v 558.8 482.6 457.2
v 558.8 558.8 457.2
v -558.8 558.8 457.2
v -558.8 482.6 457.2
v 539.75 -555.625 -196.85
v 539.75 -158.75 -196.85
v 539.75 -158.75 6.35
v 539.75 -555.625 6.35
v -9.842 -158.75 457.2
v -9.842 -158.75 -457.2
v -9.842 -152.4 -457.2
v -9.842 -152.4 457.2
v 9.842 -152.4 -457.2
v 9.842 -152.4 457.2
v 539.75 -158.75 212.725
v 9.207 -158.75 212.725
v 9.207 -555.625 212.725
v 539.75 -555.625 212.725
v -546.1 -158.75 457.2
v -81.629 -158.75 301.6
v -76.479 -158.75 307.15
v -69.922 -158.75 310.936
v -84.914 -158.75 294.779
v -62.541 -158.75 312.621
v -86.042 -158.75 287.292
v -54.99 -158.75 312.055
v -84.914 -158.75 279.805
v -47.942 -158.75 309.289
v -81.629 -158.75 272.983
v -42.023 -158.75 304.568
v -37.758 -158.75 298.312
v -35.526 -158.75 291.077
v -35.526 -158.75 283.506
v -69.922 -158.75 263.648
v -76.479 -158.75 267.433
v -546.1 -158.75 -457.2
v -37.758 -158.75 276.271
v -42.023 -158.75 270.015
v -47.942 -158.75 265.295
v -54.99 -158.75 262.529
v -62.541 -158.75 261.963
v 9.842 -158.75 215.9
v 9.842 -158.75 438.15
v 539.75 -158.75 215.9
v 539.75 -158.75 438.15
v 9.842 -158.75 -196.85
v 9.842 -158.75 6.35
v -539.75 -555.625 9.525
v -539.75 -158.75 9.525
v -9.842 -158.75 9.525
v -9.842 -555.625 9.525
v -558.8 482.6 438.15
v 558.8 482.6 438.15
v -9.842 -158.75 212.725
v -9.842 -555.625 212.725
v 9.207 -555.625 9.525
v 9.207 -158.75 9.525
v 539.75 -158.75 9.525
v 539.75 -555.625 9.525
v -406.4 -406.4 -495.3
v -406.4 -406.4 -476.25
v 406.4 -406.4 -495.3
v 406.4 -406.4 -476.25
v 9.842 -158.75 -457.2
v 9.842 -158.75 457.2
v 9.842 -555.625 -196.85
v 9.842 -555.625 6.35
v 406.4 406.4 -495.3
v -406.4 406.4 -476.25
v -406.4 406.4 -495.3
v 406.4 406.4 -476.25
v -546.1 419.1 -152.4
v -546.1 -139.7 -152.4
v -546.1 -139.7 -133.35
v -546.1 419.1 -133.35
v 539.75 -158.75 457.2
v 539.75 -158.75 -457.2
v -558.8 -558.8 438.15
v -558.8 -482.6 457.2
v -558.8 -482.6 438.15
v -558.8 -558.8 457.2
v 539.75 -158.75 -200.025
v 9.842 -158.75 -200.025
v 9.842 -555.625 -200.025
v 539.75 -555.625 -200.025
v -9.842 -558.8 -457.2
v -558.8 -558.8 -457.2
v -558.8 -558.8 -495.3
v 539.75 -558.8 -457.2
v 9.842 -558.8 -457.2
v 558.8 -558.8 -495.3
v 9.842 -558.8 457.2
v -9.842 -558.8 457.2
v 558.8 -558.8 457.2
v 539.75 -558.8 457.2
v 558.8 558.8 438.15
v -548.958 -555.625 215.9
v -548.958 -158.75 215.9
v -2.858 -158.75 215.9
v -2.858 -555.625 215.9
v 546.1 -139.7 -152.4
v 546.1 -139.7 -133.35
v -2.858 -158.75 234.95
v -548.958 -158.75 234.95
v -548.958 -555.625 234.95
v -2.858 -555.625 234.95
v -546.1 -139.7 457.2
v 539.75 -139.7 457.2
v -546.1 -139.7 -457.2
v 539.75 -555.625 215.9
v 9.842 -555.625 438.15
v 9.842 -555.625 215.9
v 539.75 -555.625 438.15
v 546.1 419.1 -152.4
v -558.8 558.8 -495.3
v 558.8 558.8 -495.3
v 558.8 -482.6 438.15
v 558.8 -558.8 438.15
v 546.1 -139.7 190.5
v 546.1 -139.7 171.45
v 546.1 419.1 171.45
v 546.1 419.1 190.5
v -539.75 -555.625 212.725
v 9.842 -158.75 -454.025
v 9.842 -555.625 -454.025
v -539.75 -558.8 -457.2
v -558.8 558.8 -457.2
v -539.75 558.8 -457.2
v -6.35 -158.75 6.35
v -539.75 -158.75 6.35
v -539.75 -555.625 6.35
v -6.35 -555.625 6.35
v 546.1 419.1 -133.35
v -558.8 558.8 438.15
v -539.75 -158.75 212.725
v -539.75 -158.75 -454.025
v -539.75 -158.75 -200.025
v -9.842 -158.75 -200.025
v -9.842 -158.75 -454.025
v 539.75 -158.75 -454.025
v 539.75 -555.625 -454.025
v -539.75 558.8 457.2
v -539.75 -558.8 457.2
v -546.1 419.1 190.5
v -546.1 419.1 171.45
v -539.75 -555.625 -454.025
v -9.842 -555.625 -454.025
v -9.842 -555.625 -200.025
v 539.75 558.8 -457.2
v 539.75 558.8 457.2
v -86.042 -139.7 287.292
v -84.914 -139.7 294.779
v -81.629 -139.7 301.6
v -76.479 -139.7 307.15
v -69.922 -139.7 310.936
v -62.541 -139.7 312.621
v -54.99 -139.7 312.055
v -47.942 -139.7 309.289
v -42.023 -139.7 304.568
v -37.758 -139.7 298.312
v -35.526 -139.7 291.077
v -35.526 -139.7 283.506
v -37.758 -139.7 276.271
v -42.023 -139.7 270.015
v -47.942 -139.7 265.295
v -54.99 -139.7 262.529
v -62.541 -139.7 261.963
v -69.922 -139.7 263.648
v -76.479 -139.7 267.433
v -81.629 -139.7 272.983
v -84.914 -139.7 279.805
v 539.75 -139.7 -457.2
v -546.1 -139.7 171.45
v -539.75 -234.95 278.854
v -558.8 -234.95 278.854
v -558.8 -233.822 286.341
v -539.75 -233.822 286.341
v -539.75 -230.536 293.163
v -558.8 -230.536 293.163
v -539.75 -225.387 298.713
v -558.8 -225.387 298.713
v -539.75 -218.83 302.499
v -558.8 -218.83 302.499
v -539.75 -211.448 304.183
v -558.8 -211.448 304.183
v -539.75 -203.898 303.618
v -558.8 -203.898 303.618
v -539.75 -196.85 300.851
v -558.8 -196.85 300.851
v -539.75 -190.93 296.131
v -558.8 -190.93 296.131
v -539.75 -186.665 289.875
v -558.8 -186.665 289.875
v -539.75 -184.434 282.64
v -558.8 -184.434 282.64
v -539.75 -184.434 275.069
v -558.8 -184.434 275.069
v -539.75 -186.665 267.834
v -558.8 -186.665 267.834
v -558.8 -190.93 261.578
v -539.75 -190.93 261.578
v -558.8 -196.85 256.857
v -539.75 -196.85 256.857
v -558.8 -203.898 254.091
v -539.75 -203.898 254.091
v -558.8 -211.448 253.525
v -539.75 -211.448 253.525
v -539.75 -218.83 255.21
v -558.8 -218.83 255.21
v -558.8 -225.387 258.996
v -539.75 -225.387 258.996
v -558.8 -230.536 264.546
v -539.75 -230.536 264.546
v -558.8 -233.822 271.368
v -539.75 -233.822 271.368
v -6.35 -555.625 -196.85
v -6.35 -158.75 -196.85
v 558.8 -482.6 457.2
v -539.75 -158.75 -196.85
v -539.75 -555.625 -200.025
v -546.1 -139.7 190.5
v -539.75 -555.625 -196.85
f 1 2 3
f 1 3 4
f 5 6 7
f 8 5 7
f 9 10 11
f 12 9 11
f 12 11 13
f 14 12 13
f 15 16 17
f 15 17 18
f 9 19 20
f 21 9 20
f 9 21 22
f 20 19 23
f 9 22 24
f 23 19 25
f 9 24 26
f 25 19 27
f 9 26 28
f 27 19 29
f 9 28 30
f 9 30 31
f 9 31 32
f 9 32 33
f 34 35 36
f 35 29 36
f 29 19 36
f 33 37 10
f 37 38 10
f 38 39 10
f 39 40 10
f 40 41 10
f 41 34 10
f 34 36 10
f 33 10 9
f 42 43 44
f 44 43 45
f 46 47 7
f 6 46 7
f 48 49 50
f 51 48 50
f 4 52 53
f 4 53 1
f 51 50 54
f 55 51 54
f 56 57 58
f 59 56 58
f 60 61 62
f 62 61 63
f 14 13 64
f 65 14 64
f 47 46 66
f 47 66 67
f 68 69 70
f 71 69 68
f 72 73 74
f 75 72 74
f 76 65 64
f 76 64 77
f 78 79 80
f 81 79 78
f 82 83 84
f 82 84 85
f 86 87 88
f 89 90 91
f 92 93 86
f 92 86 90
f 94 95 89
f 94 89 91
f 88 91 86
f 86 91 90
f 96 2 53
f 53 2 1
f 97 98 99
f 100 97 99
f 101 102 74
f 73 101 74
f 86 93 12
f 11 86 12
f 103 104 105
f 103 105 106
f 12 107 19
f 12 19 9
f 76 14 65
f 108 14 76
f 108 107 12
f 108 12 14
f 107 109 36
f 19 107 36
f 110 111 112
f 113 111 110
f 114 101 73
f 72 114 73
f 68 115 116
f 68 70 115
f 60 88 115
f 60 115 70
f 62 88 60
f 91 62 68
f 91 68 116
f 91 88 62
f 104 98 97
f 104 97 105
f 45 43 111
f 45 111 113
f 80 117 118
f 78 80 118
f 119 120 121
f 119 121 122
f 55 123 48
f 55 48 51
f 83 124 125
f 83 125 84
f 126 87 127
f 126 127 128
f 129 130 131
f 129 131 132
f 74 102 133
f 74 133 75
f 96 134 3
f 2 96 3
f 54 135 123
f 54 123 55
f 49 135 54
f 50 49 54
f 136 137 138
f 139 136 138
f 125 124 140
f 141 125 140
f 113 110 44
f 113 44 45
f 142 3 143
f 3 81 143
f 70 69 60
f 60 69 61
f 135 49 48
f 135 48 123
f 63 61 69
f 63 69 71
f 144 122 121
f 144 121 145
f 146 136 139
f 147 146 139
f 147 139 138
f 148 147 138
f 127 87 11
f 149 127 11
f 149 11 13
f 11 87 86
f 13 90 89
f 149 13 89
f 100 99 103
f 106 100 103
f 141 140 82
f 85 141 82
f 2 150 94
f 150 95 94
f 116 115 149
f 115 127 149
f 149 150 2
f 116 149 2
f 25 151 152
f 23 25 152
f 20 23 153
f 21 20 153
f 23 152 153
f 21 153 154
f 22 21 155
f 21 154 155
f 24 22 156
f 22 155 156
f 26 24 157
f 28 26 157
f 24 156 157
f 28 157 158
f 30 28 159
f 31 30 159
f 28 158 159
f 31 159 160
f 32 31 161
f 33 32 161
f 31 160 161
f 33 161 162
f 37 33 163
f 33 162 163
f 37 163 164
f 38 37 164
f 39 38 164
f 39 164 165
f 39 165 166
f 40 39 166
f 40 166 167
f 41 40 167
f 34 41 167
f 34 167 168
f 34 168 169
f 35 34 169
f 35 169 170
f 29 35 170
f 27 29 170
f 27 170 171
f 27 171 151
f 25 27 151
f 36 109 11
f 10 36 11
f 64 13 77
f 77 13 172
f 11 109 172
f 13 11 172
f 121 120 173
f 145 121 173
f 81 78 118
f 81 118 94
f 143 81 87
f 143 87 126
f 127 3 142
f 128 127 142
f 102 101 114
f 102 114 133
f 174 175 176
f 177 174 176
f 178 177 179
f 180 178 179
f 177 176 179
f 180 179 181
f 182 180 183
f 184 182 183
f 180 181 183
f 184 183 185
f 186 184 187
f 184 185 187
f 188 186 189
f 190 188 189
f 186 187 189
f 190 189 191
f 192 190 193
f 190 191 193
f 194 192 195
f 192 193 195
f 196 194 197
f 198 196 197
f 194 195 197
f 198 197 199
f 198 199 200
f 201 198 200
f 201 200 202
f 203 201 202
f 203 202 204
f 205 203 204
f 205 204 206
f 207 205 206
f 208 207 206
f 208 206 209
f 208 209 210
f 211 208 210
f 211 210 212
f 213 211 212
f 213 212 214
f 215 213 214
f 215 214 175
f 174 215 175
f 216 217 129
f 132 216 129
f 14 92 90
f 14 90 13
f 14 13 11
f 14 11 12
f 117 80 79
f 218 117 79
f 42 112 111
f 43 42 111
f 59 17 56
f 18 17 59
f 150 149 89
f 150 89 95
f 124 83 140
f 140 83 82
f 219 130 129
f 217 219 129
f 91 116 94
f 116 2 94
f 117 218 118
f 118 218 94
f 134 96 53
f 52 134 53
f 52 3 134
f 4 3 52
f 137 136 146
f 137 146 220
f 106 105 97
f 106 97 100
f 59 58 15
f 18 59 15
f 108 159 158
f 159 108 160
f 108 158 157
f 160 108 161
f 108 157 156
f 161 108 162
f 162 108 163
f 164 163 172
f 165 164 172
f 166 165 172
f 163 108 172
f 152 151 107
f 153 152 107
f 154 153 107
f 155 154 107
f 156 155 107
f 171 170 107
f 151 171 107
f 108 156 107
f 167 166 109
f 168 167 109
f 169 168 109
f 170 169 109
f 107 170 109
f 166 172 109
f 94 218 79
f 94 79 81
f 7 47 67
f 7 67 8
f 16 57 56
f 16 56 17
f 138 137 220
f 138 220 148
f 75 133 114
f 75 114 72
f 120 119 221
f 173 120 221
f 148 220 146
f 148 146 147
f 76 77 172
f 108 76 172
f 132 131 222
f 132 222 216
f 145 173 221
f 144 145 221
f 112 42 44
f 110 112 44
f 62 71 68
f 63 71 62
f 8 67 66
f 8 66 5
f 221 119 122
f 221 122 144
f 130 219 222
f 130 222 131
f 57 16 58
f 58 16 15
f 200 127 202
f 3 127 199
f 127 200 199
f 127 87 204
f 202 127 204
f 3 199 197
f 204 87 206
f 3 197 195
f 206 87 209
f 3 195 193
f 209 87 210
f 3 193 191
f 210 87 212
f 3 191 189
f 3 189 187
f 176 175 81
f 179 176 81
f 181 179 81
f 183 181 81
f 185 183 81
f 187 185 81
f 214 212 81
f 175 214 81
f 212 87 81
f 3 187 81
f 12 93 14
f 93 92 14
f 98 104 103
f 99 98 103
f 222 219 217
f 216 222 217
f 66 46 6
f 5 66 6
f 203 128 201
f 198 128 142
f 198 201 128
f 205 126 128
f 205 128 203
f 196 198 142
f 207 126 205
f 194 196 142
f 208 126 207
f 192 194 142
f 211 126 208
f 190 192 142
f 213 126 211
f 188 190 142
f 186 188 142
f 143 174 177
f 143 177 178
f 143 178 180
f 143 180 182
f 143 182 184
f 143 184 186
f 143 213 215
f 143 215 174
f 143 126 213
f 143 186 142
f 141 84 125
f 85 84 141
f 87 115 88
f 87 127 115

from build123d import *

# Parameters (mm, degrees)
F1_W          = 19.05
F1_H          = 914.4
F3_DEPTH      = 558.8
F3_DEPTH_BACK = 558.8
F2_W          = 19.05
F2_H          = 914.4
F4_DEPTH      = 558.8
F4_DEPTH_BACK = 558.8
F0_W          = 1117.6
F0_H          = 19.05
F5_DEPTH      = 558.8
F5_DEPTH_BACK = 558.8
F6_W          = 406.4
F6_H          = 914.4
F7_DEPTH      = 9.8425
F7_DEPTH_BACK = 9.8425
F8_W          = 76.2
F8_H          = 19.05
F9_DEPTH      = 1117.6
F11_DEPTH     = 914.4
F12_W         = 1117.6
F12_H         = 1117.6
F12_W_2       = 812.8
F12_H_2       = 812.8
F13_DEPTH     = 19.05
F14_W         = 546.1
F14_H         = 19.05
F15_DEPTH     = 396.875
F17_D         = 50.8
F17_DEPTH     = 25.4
F17_TIP       = 15.2618597233
F18_W         = 529.9075
F18_H         = 203.2
F19_DEPTH     = 396.875
F21_D         = 50.8
F21_DEPTH     = 25.4
F21_TIP       = 15.2618597233
F22_W         = 533.4
F22_H         = 203.2
F23_DEPTH     = 396.875
F24_W         = 529.9075
F24_H         = 254
F25_DEPTH     = 396.875
F24_H_2       = 203.2
F24_W_2       = 530.5425
F24_H_3       = 222.25
F26_W         = 1092.2
F26_H         = 19.05
F27_DEPTH     = 558.8


with BuildPart() as f3:
    # F1 (on Front) → F3 (new body, two sides)
    with BuildSketch(Plane.XZ) as f3_sk:
        with Locations((-549.275, 0)):
            Rectangle(F1_W, F1_H)
    extrude(amount=F3_DEPTH)
    extrude(f3_sk.sketch, amount=-F3_DEPTH_BACK)

    # F17
    with Locations(Plane.YZ.offset(-539.75)):
        with Locations((-209.55, 278.8544340611)):
            Hole(F17_D / 2, depth=F17_DEPTH)
            with Locations((0, 0, -(F17_DEPTH + F17_TIP / 2))):  # 118° drill point
                Cone(0, F17_D / 2, F17_TIP, mode=Mode.SUBTRACT)


with BuildPart() as f4:
    # F2 (on Front) → F4 (new body, two sides)
    with BuildSketch(Plane.XZ) as f4_sk:
        with Locations((549.275, 0)):
            Rectangle(F2_W, F2_H)
    extrude(amount=F4_DEPTH)
    extrude(f4_sk.sketch, amount=-F4_DEPTH_BACK)

    # F0 (on Front) → F5 (join, two sides)
    with BuildSketch(Plane.XZ) as f5_sk:
        with Locations((0, -466.725)):
            Rectangle(F0_W, F0_H)
    extrude(amount=F5_DEPTH)
    extrude(f5_sk.sketch, amount=-F5_DEPTH_BACK)

    # F6 (on Right) → F7 (join, two sides)
    with BuildSketch(Plane.YZ) as f7_sk:
        with Locations((-355.6, 0)):
            Rectangle(F6_W, F6_H)
    extrude(amount=F7_DEPTH)
    extrude(f7_sk.sketch, amount=-F7_DEPTH_BACK)

    # F12 (on face) → F13 (join)
    with BuildSketch(Plane(origin=(0, 0, -476.25), x_dir=(1, 0, 0), z_dir=(0, 0, -1))):
        Rectangle(F12_W, F12_H)
        Rectangle(F12_W_2, F12_H_2, mode=Mode.SUBTRACT)
    extrude(amount=F13_DEPTH)


with BuildPart() as f9:
    # F8 (on face) → F9 (new body)
    with BuildSketch(Plane(origin=(-558.8, 0, 0), x_dir=(0, -1, 0), z_dir=(-1, 0, 0))):
        with Locations((-520.7, 447.675)):
            Rectangle(F8_W, F8_H)
    extrude(amount=-F9_DEPTH)


with BuildPart() as f9b:
    # F8 (on face) → F9, piece 2 (new body)
    with BuildSketch(Plane(origin=(-558.8, 0, 0), x_dir=(0, -1, 0), z_dir=(-1, 0, 0))):
        with Locations((520.7, 447.675)):
            Rectangle(F8_W, F8_H)
    extrude(amount=-F9_DEPTH)


with BuildPart() as f11:
    # F10 (on face) → F11 (new body)
    with BuildSketch(Plane.XY.offset(-457.2)):
        Polygon((539.75, -139.7), (-546.1, -139.7), (-546.1, -158.75), (-9.8425, -158.75), (-9.8425, -152.4), (9.8425, -152.4), (9.8425, -158.75), (539.75, -158.75), align=None)
    extrude(amount=F11_DEPTH)

    # F21
    with Locations(Plane.XZ.offset(158.75)):
        with Locations((-60.6425, 287.2917993546)):
            Hole(F21_D / 2, depth=F21_DEPTH)
            with Locations((0, 0, -(F21_DEPTH + F21_TIP / 2))):  # 118° drill point
                Cone(0, F21_D / 2, F21_TIP, mode=Mode.SUBTRACT)


with BuildPart() as f15:
    # F14 (on face) → F15 (new body)
    with BuildSketch(Plane.XZ.offset(158.75)):
        with Locations((-275.9075, 225.425)):
            Rectangle(F14_W, F14_H)
    extrude(amount=F15_DEPTH)


with BuildPart() as f19:
    # F18 (on face) → F19 (new body)
    with BuildSketch(Plane.XZ.offset(158.75)):
        with Locations((-274.79625, 111.125)):
            Rectangle(F18_W, F18_H)
    extrude(amount=F19_DEPTH)


with BuildPart() as f23:
    # F22 (on face) → F23 (new body)
    with BuildSketch(Plane.XZ.offset(158.75)):
        with Locations((-273.05, -95.25)):
            Rectangle(F22_W, F22_H)
    extrude(amount=F23_DEPTH)


with BuildPart() as f25:
    # F24 (on face) → F25 (new body)
    with BuildSketch(Plane.XZ.offset(158.75)):
        with Locations((-274.79625, -327.025)):
            Rectangle(F24_W, F24_H)
    extrude(amount=F25_DEPTH)


with BuildPart() as f25b:
    # F24 (on face) → F25, piece 2 (new body)
    with BuildSketch(Plane.XZ.offset(158.75)):
        with Locations((274.79625, -327.025)):
            Rectangle(F24_W, F24_H)
    extrude(amount=F25_DEPTH)


with BuildPart() as f25c:
    # F24 (on face) → F25, piece 3 (new body)
    with BuildSketch(Plane.XZ.offset(158.75)):
        with Locations((274.79625, -95.25)):
            Rectangle(F24_W, F24_H_2)
    extrude(amount=F25_DEPTH)


with BuildPart() as f25d:
    # F24 (on face) → F25, piece 4 (new body)
    with BuildSketch(Plane.XZ.offset(158.75)):
        with Locations((274.47875, 111.125)):
            Rectangle(F24_W_2, F24_H_2)
    extrude(amount=F25_DEPTH)


with BuildPart() as f25e:
    # F24 (on face) → F25, piece 5 (new body)
    with BuildSketch(Plane.XZ.offset(158.75)):
        with Locations((274.79625, 327.025)):
            Rectangle(F24_W, F24_H_3)
    extrude(amount=F25_DEPTH)


with BuildPart() as f27:
    # F26 (on face) → F27 (new body)
    with BuildSketch(Plane(origin=(0, -139.7, 0), x_dir=(-1, 0, 0), z_dir=(0, 1, 0))):
        with Locations((0, 180.975)):
            Rectangle(F26_W, F26_H)
    extrude(amount=F27_DEPTH)


with BuildPart() as f27b:
    # F26 (on face) → F27, piece 2 (new body)
    with BuildSketch(Plane(origin=(0, -139.7, 0), x_dir=(-1, 0, 0), z_dir=(0, 1, 0))):
        with Locations((0, -142.875)):
            Rectangle(F26_W, F26_H)
    extrude(amount=F27_DEPTH)


solid = Compound([f3.part, f4.part, f9.part, f9b.part, f11.part, f15.part, f19.part, f23.part, f25.part, f25b.part, f25c.part, f25d.part, f25e.part, f27.part, f27b.part])
